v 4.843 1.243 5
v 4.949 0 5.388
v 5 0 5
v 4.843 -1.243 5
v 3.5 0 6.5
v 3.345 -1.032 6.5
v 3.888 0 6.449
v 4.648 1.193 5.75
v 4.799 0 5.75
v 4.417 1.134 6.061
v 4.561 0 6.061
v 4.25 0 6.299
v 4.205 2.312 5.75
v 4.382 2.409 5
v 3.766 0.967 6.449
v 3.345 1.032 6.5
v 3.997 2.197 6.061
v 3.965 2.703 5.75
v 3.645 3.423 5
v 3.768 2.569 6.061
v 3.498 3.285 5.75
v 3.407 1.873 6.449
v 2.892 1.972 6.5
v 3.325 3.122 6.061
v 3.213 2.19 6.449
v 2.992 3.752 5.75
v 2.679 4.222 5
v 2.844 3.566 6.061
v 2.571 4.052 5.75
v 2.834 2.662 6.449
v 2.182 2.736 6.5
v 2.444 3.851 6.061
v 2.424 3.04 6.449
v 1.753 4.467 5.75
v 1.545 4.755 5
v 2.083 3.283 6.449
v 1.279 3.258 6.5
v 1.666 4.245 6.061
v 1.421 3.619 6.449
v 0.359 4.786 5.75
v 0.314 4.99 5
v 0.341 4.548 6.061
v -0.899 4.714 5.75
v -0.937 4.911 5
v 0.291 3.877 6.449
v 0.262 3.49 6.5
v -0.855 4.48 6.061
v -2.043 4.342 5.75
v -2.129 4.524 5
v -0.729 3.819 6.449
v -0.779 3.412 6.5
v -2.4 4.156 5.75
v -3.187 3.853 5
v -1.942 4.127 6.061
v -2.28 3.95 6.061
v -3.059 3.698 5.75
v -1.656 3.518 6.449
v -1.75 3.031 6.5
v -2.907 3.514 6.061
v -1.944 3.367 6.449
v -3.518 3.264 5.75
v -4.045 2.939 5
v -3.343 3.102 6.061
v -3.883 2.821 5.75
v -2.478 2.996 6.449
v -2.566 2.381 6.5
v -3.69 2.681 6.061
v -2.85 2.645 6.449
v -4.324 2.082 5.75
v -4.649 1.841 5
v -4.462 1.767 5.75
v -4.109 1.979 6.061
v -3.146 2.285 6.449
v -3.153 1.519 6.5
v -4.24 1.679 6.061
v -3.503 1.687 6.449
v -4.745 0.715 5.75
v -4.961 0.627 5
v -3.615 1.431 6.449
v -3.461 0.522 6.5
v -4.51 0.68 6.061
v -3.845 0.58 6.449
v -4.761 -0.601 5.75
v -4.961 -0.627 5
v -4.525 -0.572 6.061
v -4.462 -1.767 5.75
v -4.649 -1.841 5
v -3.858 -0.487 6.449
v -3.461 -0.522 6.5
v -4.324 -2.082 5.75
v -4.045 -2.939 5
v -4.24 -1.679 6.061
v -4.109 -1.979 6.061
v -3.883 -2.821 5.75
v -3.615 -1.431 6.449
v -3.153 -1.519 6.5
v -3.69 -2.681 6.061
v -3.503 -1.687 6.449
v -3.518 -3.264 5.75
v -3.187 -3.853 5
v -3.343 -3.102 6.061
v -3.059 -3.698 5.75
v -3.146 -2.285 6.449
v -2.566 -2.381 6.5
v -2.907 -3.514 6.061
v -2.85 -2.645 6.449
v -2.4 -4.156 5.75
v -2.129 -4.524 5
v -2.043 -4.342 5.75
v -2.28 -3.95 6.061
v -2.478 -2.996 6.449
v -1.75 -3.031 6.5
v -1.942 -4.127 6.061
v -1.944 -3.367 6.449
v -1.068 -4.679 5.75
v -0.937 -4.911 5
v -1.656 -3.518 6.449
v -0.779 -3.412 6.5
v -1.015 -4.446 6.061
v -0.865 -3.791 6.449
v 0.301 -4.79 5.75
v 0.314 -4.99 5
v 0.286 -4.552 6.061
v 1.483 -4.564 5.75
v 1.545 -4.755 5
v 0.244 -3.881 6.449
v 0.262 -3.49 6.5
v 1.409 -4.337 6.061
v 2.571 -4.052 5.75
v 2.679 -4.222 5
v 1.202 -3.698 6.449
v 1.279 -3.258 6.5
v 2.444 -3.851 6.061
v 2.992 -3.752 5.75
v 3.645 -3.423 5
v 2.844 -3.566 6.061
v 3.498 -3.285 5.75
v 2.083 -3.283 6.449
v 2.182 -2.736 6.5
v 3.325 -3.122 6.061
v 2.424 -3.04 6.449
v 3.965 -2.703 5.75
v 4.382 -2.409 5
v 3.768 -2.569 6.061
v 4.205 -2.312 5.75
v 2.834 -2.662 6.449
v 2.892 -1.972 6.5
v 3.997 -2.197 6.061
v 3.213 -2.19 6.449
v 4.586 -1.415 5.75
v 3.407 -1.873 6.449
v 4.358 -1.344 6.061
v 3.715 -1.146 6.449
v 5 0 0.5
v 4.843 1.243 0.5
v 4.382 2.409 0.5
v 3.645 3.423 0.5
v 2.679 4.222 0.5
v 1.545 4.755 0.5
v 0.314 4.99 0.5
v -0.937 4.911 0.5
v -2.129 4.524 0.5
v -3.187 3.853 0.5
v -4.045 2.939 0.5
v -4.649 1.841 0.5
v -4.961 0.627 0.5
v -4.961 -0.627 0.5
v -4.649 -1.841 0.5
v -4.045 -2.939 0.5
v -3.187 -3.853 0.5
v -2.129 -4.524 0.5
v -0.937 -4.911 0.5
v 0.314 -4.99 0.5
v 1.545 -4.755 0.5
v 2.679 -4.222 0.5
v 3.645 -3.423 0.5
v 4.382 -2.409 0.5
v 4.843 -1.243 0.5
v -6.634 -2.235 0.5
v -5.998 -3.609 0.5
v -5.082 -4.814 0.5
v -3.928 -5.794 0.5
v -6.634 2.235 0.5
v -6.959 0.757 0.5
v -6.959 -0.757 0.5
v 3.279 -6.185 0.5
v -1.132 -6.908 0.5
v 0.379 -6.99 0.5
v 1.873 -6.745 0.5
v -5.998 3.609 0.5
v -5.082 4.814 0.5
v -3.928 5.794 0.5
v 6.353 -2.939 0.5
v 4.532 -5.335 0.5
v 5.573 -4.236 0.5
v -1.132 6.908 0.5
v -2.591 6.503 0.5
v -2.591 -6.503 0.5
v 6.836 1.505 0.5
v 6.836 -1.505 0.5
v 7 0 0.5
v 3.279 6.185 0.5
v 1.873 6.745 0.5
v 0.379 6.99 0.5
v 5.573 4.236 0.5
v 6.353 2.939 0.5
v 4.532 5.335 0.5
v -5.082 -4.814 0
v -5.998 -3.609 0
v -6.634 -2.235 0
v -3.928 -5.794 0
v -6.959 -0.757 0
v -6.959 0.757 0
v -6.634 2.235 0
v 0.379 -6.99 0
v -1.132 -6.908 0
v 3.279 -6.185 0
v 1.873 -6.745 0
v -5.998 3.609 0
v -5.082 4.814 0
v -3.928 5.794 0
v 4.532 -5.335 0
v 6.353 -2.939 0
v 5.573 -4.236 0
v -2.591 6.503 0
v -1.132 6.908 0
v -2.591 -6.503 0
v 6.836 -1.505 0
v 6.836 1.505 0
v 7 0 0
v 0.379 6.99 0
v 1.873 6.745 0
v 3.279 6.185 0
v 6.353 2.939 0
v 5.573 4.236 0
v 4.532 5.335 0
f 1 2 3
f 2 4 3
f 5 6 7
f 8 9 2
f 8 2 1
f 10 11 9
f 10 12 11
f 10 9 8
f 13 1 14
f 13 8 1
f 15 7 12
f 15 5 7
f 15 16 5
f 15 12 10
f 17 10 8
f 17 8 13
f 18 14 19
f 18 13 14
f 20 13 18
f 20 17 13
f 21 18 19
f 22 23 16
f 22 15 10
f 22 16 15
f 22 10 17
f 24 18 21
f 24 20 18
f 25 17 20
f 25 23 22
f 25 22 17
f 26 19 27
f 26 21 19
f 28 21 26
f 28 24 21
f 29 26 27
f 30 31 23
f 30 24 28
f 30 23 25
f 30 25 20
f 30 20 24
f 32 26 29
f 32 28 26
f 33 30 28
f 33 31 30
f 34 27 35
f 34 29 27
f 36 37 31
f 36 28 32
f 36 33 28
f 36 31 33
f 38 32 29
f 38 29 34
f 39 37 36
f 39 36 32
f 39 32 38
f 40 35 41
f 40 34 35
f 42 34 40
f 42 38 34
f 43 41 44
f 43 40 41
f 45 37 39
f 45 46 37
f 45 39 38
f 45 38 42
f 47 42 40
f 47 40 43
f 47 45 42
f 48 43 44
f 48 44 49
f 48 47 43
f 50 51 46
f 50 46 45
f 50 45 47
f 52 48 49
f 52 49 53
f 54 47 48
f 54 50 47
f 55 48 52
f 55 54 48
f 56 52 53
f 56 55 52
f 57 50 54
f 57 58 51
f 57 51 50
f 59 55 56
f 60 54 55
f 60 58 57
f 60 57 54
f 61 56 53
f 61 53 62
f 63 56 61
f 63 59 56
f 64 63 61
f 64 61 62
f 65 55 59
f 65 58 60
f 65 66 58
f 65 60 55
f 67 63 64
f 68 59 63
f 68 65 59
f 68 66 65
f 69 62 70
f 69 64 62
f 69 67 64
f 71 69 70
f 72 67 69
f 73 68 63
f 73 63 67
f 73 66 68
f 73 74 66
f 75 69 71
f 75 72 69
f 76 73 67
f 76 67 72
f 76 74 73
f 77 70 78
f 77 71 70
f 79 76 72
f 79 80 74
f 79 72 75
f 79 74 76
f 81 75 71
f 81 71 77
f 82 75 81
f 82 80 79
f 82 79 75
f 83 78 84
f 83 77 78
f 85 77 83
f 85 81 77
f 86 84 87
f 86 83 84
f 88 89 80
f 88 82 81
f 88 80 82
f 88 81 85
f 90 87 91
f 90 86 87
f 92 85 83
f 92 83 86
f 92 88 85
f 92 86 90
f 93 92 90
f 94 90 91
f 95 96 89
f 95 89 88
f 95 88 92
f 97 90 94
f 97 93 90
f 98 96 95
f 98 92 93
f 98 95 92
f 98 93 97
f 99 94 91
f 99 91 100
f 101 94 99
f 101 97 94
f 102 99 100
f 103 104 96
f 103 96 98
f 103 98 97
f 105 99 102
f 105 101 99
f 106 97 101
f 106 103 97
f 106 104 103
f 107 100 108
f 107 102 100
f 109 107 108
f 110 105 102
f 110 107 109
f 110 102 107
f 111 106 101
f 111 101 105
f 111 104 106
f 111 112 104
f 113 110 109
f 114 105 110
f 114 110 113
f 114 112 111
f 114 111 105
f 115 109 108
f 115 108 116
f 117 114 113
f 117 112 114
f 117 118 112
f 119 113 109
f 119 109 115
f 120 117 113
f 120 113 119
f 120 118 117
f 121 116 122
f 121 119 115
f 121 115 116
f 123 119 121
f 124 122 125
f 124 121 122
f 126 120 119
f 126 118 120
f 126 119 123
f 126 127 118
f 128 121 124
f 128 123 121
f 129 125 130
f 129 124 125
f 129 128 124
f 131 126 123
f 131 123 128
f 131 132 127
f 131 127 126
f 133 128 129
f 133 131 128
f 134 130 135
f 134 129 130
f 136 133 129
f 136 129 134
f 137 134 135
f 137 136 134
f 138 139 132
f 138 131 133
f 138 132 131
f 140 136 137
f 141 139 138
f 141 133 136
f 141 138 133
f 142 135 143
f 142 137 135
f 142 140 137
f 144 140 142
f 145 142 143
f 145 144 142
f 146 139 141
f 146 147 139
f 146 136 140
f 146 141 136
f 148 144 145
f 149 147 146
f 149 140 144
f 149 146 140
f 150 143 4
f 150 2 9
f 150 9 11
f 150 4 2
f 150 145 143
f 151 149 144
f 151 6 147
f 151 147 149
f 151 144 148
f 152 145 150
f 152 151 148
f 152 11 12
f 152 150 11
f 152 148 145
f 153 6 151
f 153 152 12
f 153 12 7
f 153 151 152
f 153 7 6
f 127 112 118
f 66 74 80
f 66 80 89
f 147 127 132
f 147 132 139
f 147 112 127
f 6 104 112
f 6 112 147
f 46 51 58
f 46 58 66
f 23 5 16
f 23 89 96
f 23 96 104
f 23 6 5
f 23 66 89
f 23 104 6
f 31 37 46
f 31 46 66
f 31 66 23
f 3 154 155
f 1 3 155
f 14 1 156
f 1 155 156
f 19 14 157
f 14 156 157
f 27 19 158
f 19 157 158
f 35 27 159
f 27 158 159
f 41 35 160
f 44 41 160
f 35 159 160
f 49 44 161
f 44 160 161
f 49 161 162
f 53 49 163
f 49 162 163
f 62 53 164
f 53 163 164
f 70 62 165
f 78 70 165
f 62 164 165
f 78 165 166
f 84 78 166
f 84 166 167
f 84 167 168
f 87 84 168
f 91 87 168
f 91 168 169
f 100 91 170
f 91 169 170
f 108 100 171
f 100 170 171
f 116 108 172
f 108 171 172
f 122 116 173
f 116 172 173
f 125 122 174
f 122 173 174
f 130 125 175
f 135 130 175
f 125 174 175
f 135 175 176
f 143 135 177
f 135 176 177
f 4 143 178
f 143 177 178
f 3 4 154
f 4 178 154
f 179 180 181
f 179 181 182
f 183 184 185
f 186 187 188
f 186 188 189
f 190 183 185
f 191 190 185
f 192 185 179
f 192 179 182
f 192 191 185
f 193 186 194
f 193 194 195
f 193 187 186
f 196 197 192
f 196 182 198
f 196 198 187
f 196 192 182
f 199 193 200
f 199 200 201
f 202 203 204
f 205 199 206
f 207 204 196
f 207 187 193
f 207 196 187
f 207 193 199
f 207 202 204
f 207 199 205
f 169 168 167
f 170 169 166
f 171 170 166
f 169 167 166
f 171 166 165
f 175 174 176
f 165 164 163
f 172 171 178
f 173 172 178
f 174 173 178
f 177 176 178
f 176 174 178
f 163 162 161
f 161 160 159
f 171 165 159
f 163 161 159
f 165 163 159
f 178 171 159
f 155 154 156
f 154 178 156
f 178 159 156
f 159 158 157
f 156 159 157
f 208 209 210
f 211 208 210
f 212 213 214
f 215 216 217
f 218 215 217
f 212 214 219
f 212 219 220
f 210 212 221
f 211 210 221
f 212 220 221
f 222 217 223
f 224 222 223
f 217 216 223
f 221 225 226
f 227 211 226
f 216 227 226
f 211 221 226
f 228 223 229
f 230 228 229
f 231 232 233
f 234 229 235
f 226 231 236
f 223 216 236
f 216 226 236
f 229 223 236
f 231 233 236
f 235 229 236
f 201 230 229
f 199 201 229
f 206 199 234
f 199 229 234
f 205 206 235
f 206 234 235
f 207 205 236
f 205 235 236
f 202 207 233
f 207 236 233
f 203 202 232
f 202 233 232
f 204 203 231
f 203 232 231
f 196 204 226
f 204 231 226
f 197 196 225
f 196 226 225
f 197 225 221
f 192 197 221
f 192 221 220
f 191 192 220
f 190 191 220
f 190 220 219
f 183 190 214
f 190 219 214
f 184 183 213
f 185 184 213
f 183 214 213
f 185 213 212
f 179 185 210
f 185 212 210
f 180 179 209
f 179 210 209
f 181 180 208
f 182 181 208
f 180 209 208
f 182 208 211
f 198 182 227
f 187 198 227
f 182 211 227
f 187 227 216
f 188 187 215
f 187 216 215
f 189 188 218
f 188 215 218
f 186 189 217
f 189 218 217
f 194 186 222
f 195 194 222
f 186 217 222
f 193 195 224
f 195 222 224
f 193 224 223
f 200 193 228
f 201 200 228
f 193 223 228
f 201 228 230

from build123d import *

# Parameters (mm, degrees)
SKETCH_R     = 7
PAD_DEPTH    = 0.5
SKETCH001_R  = 5
PAD001_DEPTH = 6
FILLET_R     = 1.5


with BuildPart() as pad:
    # Sketch → Pad (new body)
    with BuildSketch(Plane.XY):
        Circle(SKETCH_R)
    extrude(amount=PAD_DEPTH)


with BuildPart() as fillet_body:
    # Sketch001 → Pad001 (new body)
    with BuildSketch(Plane.XY.offset(0.5)):
        Circle(SKETCH001_R)
    extrude(amount=PAD001_DEPTH)

    # Fillet
    fillet_edges = [fillet_body.edges().sort_by_distance(p)[0] for p in [
        (-5, 0, 6.5),
    ]]
    fillet(fillet_edges, radius=FILLET_R)


solid = Compound([pad.part, fillet_body.part])
